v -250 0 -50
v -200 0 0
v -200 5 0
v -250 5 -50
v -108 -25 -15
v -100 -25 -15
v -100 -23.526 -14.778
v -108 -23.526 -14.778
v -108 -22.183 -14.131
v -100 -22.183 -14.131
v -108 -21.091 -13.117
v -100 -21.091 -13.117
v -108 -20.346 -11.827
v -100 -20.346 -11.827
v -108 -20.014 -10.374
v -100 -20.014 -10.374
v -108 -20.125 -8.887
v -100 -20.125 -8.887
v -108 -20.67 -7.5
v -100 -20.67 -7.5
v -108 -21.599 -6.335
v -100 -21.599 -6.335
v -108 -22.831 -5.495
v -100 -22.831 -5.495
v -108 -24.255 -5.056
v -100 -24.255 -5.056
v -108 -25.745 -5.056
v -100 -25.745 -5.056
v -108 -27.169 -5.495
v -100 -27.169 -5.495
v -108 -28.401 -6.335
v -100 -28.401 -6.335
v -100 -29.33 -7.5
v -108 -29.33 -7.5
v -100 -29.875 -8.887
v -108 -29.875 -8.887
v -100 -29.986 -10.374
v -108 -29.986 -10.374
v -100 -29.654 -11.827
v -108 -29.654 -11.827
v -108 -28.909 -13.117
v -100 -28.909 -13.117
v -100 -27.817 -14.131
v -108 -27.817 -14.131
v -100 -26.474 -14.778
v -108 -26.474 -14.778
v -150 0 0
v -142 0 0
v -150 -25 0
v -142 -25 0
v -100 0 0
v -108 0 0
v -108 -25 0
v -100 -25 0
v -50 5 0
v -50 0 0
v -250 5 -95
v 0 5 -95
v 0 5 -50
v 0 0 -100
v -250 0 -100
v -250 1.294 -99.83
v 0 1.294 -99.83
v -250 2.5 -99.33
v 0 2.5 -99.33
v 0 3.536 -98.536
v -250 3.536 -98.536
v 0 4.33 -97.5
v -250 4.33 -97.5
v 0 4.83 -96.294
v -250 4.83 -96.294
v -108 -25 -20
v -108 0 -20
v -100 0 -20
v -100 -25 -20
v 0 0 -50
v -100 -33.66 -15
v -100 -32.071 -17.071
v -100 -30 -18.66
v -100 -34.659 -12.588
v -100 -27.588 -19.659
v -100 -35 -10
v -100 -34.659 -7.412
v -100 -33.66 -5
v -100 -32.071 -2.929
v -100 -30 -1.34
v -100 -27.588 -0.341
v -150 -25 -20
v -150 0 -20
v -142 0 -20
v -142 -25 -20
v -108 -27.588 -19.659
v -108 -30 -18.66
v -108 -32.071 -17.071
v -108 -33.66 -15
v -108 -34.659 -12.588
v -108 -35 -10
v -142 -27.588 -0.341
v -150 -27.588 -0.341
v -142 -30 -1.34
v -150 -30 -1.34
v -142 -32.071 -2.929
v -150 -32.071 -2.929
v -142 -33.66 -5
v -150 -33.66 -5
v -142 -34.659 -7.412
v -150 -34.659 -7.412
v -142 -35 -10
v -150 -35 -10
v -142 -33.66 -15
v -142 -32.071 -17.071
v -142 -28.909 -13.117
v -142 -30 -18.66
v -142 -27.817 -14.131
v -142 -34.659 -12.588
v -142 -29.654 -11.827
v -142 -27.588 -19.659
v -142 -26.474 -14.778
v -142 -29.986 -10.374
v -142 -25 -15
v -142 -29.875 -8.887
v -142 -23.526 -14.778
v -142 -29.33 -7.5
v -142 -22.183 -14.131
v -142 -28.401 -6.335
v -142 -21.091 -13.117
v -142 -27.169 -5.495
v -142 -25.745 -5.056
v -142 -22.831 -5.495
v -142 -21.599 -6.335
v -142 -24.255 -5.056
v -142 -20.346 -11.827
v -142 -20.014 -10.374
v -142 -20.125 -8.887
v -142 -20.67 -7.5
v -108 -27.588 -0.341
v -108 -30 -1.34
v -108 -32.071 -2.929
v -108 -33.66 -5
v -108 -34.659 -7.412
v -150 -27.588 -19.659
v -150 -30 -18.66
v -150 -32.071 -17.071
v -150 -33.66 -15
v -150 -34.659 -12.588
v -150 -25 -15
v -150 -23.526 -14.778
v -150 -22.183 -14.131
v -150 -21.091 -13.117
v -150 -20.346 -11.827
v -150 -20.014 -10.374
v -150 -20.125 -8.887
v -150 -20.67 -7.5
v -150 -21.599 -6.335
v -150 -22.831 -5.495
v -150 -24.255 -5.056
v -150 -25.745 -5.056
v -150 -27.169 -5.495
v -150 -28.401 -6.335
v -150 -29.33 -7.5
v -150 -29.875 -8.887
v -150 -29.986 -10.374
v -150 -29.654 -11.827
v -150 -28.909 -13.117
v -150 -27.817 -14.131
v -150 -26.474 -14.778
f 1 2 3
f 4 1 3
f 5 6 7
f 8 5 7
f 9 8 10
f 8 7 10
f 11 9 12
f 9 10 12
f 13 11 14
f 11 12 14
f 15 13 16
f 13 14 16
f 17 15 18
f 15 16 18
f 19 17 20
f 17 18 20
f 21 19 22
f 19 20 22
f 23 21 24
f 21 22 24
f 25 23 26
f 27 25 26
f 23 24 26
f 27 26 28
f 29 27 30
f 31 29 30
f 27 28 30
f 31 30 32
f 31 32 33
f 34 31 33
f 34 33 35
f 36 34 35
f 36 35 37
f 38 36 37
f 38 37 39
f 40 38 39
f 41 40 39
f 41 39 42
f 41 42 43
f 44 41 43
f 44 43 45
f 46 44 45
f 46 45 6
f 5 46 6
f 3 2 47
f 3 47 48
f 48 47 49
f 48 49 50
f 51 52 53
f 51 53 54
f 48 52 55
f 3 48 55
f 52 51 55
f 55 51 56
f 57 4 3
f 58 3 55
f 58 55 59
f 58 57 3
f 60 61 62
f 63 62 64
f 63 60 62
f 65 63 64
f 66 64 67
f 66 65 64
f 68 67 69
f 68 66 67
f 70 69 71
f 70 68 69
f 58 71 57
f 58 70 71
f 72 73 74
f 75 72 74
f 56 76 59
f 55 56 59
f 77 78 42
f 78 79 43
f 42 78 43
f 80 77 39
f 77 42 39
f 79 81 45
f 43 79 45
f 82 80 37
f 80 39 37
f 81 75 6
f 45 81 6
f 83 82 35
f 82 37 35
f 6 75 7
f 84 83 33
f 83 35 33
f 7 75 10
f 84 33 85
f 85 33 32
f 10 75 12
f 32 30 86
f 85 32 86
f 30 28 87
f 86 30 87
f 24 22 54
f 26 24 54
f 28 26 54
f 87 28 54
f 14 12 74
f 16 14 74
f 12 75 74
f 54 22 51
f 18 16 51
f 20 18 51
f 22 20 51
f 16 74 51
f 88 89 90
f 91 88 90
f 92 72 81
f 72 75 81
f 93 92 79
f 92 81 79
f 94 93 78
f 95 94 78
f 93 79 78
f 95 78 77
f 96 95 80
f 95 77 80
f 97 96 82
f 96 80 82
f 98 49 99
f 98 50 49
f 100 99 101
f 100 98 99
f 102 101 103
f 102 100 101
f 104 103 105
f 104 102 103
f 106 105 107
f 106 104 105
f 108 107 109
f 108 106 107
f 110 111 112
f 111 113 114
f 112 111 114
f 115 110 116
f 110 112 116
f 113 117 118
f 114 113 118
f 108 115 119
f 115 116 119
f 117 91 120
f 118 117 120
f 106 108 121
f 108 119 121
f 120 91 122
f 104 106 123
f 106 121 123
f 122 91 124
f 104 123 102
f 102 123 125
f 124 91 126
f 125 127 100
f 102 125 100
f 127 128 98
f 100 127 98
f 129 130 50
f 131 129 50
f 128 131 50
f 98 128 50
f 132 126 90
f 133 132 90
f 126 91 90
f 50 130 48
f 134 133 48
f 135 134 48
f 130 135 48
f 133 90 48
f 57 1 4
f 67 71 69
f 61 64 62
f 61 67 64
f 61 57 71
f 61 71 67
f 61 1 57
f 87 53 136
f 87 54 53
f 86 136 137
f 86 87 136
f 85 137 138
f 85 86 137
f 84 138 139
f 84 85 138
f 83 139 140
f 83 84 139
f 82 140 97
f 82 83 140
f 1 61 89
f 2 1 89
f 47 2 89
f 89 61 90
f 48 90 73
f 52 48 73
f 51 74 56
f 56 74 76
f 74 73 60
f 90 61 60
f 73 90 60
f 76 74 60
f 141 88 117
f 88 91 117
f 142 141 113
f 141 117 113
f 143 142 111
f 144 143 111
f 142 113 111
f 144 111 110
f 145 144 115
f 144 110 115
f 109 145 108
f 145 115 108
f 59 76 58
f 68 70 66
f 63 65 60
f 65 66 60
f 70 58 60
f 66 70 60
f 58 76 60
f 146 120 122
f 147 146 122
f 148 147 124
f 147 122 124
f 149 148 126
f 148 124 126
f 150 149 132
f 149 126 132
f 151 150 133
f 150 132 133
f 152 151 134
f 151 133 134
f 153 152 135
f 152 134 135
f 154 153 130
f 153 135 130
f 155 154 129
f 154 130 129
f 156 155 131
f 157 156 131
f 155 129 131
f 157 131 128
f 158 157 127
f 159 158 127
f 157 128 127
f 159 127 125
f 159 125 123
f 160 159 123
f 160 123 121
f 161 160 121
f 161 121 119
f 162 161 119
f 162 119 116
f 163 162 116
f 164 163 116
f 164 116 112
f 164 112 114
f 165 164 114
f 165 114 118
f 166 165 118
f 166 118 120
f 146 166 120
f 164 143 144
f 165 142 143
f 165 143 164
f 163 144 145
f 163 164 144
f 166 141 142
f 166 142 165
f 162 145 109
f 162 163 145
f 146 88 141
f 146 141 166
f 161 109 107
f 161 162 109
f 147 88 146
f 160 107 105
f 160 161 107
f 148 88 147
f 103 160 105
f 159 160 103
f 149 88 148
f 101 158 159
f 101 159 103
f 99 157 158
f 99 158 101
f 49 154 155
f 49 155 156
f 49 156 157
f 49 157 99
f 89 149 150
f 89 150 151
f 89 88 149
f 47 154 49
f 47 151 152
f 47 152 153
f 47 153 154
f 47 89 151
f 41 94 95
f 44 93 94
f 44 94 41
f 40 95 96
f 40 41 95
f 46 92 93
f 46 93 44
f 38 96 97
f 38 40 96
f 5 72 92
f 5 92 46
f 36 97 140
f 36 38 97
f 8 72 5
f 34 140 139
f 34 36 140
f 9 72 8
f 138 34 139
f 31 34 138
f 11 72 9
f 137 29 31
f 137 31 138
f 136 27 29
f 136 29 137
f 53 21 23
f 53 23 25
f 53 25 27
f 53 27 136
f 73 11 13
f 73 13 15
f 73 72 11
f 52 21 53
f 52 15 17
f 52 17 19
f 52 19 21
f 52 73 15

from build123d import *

# Parameters (mm, degrees)
SKETCH1_W           = 250
SKETCH1_H           = 100
BOSS_EXTRUDE1_DEPTH = 5
CHAMFER2_SIZE       = 50
FILLET1_R           = 5
SKETCH2_W           = 8
SKETCH2_H           = 20
BOSS_EXTRUDE2_DEPTH = 35
SKETCH4_R           = 5
CUT_EXTRUDE1_DEPTH  = 184.643676722
FILLET2_R           = 10


with BuildPart() as part:
    # Sketch1 → Boss-Extrude1 (new body)
    with BuildSketch(Plane(origin=(0, 0, 0), x_dir=(1, 0, 0), z_dir=(0, 1, 0))):
        with Locations((-125, 50)):
            Rectangle(SKETCH1_W, SKETCH1_H)
    extrude(amount=BOSS_EXTRUDE1_DEPTH)

    # Chamfer2
    chamfer2_edges = [part.edges().sort_by_distance(p)[0] for p in [
        (0, 2.5, 0),
        (-250, 2.5, 0),
    ]]
    chamfer(chamfer2_edges, length=CHAMFER2_SIZE)

    # Fillet1
    fillet1_edges = [part.edges().sort_by_distance(p)[0] for p in [
        (-125, 5, -100),
    ]]
    fillet(fillet1_edges, radius=FILLET1_R - 0.0001)  # a hair under: the kernel refuses the full size

    # Sketch2 → Boss-Extrude2 (add)
    with BuildSketch(Plane.XZ):
        with Locations((-146, -10)):
            Rectangle(SKETCH2_W, SKETCH2_H)
        with Locations((-104, -10)):
            Rectangle(SKETCH2_W, SKETCH2_H)
    extrude(amount=BOSS_EXTRUDE2_DEPTH)

    # Sketch4 → Cut-Extrude1 (cut, through all)
    with BuildSketch(Plane(origin=(-100, 0, 0), x_dir=(0, 0, -1), z_dir=(1, 0, 0))):
        with Locations((10, -25)):
            Circle(SKETCH4_R)
    extrude(amount=-CUT_EXTRUDE1_DEPTH, mode=Mode.SUBTRACT)

    # Fillet2
    fillet2_edges = [part.edges().sort_by_distance(p)[0] for p in [
        (-104, -35, -20),
        (-146, -35, -20),
        (-146, -35, 0),
        (-104, -35, 0),
    ]]
    fillet(fillet2_edges, radius=FILLET2_R - 0.0001)  # a hair under: the kernel refuses the full size


solid = part.part
